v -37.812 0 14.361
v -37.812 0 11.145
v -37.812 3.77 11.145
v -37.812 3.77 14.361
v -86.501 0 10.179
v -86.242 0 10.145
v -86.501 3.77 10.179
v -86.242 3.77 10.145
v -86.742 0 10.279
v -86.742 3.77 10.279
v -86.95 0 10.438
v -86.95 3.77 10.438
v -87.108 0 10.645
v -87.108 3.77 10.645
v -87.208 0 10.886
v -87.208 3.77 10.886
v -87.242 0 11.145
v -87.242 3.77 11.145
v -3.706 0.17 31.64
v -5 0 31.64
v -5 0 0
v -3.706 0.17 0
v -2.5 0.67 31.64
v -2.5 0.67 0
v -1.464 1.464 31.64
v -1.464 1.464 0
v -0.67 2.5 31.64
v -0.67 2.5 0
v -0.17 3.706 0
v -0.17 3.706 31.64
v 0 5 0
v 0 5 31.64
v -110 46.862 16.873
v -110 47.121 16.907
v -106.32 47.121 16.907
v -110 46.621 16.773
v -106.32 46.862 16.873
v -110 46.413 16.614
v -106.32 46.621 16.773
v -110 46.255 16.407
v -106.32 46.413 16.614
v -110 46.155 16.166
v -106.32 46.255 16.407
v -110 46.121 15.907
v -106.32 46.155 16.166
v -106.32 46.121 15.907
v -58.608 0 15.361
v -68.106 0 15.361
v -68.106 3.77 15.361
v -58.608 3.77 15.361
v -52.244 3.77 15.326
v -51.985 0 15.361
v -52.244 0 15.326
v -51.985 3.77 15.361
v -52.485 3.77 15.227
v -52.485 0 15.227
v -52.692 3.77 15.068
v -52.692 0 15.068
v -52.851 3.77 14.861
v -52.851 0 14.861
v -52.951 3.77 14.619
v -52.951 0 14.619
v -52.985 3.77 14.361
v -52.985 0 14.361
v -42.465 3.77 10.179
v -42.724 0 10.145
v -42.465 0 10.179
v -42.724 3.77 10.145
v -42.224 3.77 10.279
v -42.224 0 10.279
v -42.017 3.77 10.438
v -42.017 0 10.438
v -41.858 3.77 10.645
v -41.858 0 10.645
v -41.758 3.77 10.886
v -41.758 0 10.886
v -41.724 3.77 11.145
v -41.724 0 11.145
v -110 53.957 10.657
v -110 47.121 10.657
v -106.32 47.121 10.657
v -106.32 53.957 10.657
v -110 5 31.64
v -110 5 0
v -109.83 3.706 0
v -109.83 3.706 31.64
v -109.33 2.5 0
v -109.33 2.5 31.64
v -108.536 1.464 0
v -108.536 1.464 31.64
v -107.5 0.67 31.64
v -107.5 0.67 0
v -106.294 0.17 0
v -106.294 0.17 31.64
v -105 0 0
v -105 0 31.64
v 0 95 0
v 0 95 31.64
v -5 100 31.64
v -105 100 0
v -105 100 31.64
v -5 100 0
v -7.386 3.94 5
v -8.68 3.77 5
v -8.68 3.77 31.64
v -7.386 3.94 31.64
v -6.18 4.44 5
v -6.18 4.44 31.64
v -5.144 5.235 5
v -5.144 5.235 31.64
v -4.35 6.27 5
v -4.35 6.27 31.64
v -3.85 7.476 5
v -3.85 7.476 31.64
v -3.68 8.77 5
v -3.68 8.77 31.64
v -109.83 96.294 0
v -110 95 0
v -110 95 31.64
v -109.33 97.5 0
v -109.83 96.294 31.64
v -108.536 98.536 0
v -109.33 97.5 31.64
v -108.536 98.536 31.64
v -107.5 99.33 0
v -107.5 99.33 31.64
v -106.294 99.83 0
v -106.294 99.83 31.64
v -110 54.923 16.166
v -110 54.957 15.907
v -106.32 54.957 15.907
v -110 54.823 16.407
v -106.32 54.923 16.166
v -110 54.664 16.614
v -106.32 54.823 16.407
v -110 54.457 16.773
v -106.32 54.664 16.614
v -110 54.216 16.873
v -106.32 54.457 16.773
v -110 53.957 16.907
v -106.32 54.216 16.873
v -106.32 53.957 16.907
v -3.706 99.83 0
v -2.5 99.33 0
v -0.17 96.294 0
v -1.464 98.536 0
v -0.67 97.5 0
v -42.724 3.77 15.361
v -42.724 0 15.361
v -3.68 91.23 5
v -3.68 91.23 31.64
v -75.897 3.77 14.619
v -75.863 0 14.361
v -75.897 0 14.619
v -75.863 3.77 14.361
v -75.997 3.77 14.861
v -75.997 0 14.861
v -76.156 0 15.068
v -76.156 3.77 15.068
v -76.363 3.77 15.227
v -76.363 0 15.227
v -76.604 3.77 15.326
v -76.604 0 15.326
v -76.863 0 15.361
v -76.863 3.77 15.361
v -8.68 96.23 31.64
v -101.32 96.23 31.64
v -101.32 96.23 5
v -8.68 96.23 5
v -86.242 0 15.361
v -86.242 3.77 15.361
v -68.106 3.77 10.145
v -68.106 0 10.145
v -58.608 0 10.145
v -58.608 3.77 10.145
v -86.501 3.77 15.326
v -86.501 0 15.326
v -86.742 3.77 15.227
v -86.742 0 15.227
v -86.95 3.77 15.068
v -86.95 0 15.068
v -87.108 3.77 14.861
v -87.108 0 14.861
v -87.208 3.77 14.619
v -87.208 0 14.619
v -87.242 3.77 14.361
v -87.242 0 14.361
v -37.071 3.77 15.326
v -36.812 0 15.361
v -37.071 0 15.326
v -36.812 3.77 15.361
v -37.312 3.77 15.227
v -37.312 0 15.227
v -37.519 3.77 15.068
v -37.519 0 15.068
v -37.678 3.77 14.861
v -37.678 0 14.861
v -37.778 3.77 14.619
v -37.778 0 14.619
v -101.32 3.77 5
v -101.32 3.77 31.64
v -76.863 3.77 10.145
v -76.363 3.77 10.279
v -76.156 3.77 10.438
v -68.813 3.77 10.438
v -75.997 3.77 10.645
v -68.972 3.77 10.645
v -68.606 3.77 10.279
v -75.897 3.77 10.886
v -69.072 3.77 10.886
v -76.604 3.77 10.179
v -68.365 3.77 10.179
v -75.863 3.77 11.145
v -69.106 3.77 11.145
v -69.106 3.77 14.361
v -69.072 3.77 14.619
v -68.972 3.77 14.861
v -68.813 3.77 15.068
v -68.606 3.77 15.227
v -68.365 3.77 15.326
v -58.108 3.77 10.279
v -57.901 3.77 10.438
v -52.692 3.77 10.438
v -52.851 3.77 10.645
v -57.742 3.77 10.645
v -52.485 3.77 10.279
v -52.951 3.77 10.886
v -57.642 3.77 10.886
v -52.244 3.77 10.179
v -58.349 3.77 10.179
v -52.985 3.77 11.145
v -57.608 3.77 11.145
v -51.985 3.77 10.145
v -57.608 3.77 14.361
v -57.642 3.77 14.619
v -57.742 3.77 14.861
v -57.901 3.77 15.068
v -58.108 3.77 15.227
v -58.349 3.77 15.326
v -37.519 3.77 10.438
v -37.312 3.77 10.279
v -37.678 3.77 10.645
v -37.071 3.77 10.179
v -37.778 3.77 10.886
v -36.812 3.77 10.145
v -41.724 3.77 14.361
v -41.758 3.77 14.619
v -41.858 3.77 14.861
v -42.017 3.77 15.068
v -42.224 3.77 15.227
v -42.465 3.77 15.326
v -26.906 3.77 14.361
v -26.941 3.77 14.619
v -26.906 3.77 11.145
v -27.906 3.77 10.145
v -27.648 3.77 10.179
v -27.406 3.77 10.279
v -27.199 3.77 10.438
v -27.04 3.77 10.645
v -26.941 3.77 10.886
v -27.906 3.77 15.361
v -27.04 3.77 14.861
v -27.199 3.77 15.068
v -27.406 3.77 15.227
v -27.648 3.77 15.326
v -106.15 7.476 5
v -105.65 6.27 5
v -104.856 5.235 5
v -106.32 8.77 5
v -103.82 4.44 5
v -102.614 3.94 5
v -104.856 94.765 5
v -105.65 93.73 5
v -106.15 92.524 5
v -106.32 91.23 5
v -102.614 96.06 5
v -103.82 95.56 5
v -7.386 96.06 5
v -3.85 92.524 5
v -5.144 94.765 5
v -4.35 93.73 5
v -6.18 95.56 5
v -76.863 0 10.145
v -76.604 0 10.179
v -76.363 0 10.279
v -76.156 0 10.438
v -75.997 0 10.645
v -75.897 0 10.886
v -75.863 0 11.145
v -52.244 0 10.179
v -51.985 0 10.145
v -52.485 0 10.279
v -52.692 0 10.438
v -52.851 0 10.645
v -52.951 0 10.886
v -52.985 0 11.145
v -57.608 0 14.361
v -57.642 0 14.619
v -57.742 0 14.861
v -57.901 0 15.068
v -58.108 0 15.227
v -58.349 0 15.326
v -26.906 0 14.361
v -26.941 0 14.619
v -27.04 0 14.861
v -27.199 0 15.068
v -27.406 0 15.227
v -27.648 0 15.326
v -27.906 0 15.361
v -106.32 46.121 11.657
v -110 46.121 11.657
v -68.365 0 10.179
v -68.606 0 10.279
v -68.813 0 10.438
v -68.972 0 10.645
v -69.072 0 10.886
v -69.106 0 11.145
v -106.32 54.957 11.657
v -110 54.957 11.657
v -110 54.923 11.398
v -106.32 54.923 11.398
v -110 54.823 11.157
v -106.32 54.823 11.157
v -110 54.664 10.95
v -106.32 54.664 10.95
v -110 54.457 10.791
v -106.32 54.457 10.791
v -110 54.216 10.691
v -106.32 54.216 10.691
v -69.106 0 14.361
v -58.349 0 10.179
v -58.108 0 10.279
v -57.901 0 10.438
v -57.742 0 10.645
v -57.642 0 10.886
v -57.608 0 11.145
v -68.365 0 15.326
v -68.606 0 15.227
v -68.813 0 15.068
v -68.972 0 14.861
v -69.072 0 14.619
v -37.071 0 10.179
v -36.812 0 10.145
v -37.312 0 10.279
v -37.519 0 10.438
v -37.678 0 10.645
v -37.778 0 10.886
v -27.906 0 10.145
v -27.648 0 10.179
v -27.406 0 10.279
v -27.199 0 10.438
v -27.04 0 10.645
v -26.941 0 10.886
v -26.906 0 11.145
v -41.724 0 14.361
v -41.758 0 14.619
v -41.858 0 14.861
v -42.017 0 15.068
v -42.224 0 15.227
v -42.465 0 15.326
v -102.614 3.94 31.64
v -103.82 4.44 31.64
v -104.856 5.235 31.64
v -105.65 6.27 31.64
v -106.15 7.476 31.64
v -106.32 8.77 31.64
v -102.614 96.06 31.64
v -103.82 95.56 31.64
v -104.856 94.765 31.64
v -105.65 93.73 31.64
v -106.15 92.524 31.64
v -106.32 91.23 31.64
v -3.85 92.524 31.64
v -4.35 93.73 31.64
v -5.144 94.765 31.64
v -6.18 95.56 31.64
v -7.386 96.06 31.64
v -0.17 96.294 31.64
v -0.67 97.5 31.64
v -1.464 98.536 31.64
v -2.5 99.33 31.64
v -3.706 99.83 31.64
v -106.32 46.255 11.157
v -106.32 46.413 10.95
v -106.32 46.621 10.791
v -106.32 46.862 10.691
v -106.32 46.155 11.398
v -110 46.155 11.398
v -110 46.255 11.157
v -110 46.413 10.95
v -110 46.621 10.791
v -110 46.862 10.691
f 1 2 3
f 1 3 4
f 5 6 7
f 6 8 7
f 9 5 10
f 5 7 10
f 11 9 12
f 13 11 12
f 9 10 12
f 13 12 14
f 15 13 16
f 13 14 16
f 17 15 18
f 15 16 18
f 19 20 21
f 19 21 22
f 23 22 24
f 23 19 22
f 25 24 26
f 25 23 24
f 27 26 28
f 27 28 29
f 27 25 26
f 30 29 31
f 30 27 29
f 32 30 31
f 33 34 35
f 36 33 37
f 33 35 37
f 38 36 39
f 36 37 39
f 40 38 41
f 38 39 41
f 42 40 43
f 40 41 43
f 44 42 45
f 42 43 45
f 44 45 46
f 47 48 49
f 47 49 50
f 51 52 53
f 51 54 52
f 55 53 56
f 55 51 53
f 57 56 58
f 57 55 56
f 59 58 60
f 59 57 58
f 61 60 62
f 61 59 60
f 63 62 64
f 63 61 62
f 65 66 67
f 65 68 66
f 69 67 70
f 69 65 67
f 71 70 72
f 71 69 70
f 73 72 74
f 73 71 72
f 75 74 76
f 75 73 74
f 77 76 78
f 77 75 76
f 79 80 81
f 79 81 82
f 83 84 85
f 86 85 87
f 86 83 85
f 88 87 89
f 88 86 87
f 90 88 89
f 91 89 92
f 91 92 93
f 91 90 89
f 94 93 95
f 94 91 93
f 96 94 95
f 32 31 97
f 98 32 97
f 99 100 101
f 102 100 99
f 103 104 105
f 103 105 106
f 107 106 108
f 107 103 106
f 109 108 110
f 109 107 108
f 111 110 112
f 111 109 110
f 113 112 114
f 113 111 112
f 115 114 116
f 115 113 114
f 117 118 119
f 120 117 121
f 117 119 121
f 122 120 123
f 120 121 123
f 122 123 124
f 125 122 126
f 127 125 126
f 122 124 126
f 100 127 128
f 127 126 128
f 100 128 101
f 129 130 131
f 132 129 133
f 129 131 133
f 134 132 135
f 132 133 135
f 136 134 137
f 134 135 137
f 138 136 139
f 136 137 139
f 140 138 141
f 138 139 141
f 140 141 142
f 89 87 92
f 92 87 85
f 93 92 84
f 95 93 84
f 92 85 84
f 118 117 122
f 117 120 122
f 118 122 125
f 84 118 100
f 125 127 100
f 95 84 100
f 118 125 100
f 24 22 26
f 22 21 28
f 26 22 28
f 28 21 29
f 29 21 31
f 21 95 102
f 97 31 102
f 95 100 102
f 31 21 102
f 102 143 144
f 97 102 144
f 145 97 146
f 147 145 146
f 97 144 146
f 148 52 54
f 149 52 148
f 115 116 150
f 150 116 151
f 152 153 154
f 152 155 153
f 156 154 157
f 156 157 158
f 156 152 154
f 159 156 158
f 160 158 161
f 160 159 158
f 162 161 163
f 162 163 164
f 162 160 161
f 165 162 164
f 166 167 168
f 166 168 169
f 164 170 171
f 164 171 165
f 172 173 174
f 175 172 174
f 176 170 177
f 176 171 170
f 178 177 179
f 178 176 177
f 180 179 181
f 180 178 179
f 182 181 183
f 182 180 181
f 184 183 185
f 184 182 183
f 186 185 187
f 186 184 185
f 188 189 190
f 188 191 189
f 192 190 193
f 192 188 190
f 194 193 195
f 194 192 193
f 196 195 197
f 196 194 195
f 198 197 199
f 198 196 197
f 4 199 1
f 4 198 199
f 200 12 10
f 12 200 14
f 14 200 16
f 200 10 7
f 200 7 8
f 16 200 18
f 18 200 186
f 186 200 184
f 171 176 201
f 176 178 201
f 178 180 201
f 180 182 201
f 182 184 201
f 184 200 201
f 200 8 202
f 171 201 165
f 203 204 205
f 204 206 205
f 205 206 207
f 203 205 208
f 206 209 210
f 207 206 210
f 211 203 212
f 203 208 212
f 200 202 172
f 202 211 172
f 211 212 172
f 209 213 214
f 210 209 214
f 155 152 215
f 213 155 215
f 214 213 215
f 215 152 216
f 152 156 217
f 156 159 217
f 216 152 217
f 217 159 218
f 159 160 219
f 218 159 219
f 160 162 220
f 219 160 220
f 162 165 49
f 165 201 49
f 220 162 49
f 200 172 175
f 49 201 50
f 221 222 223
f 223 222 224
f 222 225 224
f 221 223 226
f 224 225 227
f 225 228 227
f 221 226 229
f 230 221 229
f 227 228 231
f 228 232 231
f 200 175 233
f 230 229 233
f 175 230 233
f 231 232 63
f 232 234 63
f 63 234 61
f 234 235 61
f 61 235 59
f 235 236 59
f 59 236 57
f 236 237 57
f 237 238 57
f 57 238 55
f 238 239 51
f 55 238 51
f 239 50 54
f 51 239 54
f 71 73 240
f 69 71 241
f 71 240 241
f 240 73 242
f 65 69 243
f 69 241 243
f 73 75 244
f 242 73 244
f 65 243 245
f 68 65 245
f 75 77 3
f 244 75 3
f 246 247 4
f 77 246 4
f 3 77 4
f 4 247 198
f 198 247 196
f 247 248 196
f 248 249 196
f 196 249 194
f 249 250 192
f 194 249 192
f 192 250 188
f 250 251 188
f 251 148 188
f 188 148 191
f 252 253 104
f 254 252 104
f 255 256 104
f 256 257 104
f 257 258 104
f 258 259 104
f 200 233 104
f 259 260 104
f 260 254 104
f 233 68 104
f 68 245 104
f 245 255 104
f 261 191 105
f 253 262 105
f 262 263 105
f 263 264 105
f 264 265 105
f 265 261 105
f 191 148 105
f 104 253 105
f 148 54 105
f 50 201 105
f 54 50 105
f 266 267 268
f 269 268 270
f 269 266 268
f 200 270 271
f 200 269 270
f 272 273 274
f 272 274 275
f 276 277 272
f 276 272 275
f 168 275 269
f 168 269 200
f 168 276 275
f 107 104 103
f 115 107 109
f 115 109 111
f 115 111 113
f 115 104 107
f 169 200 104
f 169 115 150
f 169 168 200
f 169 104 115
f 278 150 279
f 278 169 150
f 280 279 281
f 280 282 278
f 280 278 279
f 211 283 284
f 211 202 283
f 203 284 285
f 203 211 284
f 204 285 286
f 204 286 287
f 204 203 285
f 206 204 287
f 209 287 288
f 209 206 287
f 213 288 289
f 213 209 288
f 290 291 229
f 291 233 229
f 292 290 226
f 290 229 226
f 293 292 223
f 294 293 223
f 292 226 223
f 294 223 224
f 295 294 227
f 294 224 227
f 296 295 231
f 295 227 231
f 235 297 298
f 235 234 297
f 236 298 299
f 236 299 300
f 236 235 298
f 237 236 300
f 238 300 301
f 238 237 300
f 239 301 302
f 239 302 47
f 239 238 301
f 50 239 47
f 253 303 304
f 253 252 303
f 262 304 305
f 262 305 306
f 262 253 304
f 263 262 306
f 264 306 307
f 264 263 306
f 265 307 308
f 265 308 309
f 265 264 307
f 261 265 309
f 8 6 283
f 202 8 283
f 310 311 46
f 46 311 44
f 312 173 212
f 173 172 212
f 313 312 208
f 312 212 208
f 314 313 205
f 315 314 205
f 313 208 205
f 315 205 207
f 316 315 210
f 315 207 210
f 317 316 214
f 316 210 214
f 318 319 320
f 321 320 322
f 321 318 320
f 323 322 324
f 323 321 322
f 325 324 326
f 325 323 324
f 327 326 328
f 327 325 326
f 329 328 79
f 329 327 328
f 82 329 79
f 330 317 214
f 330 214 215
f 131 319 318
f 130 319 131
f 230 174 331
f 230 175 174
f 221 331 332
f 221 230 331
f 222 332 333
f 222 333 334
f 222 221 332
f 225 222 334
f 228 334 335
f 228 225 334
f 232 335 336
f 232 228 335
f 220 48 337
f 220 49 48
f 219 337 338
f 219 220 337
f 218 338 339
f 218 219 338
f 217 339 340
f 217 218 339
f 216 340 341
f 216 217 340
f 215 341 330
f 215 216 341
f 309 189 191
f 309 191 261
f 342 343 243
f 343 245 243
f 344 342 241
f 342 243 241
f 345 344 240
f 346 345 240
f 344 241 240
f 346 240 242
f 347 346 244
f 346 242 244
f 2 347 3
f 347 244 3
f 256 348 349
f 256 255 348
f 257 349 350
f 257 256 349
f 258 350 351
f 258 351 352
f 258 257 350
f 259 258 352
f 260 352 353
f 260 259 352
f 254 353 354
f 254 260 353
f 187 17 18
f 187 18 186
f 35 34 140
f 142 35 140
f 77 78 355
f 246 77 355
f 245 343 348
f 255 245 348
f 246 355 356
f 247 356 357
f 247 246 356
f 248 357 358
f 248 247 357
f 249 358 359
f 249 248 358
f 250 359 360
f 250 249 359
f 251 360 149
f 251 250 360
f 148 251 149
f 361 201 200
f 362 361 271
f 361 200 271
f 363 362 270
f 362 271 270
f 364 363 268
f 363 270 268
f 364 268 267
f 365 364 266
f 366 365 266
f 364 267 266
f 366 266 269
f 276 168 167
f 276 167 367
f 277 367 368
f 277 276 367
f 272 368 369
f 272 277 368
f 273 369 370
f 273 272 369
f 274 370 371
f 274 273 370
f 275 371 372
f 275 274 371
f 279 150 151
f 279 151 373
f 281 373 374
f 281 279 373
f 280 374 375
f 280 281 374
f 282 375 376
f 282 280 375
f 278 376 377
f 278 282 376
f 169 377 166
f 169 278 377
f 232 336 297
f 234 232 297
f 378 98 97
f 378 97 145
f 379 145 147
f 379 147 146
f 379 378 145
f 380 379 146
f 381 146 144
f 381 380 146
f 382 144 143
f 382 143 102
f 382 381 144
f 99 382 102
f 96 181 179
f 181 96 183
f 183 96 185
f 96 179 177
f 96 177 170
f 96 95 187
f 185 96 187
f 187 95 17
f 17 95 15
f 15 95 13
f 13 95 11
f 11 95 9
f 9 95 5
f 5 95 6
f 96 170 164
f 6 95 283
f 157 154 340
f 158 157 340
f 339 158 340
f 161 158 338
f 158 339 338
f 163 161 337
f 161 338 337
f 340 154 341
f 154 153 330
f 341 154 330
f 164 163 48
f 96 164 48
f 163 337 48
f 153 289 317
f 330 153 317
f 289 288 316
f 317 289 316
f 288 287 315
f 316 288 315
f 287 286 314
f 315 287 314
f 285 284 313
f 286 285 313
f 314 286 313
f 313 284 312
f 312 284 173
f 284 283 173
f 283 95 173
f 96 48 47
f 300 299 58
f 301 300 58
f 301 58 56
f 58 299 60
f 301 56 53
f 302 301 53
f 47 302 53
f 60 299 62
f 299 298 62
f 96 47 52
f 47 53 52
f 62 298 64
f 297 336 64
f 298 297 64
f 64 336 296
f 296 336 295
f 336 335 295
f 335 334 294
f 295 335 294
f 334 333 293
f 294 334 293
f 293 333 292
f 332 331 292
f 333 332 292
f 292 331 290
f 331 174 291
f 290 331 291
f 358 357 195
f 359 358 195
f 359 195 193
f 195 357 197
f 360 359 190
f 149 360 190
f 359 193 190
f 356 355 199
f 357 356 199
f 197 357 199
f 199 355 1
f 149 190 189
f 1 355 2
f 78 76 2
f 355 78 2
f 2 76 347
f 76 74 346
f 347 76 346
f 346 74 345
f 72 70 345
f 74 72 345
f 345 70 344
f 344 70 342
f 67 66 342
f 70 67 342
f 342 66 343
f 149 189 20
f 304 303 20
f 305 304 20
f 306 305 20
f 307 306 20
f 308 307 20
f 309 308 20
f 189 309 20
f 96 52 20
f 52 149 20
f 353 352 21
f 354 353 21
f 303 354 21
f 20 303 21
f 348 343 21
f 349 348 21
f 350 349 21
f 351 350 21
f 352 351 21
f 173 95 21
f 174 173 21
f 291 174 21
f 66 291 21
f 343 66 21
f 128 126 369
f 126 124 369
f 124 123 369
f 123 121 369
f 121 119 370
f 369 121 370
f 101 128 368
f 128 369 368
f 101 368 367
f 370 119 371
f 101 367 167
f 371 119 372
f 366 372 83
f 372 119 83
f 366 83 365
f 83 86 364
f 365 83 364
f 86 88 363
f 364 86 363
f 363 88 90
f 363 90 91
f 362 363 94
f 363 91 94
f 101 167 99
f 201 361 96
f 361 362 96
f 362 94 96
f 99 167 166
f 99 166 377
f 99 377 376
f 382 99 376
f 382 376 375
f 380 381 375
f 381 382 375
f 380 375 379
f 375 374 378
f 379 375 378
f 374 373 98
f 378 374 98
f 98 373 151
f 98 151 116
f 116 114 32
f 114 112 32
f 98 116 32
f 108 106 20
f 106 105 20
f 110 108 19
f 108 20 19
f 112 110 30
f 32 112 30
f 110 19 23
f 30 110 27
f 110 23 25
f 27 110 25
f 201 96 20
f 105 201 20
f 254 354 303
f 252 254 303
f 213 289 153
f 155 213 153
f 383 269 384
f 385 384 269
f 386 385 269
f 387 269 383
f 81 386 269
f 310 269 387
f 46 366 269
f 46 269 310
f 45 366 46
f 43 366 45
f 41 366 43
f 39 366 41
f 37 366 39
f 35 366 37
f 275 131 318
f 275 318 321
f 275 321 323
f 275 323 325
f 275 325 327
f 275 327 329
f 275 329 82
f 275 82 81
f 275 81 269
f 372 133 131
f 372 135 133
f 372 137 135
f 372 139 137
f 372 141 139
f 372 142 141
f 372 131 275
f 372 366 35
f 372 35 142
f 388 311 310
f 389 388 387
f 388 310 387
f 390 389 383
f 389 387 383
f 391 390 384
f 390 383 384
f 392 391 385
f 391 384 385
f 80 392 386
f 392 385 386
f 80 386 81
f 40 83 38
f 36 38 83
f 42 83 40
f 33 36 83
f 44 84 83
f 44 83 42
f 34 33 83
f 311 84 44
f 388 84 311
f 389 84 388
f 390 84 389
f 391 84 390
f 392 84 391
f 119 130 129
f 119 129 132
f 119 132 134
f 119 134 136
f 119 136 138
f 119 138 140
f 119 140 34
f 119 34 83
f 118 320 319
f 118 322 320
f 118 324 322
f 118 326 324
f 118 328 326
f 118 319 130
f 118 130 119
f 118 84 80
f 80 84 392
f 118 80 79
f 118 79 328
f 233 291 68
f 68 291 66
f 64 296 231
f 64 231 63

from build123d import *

# Parameters (mm, degrees)
ESQUISSE1_W             = 110
ESQUISSE1_H             = 100
BOSS_EXTRU_1_DEPTH      = 60
CONG_1_R                = 5
ESQUISSE2_W             = 102.640200382
ESQUISSE2_H             = 92.45985442
ENL_V_MAT_EXTRU_1_DEPTH = 55
CONG_2_R                = 5
ESQUISSE3_W             = 11.37967439
ESQUISSE3_H             = 5.215684095
ESQUISSE3_W_2           = 11.498212665
ESQUISSE3_W_3           = 11.261136116
ESQUISSE3_W_4           = 10.905521291
ENL_V_MAT_EXTRU_2_DEPTH = 55
CONG_3_R                = 1
ESQUISSE4_W             = 6.250199949
ESQUISSE4_H             = 8.836489583
ENL_V_MAT_EXTRU_3_DEPTH = 55
CONG_4_R                = 1
ESQUISSE6_W             = 129.088181363
ESQUISSE6_H             = 36.035635569
ENL_V_MAT_EXTRU_5_DEPTH = 115


with BuildPart() as part:
    # Esquisse1 → Boss.-Extru.1 (new body)
    with BuildSketch(Plane.XY):
        with Locations((-55, 50)):
            Rectangle(ESQUISSE1_W, ESQUISSE1_H)
    extrude(amount=BOSS_EXTRU_1_DEPTH)

    # Congé1
    cong_1_edges = [part.edges().sort_by_distance(p)[0] for p in [
        (0, 0, 30),
        (-110, 0, 30),
        (-110, 100, 30),
        (0, 100, 30),
    ]]
    fillet(cong_1_edges, radius=CONG_1_R)

    # Esquisse2 → Enlèv. mat.-Extru.1 (cut)
    with BuildSketch(Plane.XY.offset(60)):
        with Locations((-55, 50)):
            Rectangle(ESQUISSE2_W, ESQUISSE2_H)
    extrude(amount=-ENL_V_MAT_EXTRU_1_DEPTH, mode=Mode.SUBTRACT)

    # Congé2
    cong_2_edges = [part.edges().sort_by_distance(p)[0] for p in [
        (-106.320100191, 3.77007279, 32.5),
        (-106.320100191, 96.22992721, 32.5),
        (-3.679899809, 96.22992721, 32.5),
        (-3.679899809, 3.77007279, 32.5),
    ]]
    fillet(cong_2_edges, radius=CONG_2_R)

    # Esquisse3 → Enlèv. mat.-Extru.2 (cut)
    with BuildSketch(Plane.XZ):
        with Locations((-81.552573577, 12.752681003)):
            Rectangle(ESQUISSE3_W, ESQUISSE3_H)
        with Locations((-63.356948381, 12.752681003)):
            Rectangle(ESQUISSE3_W_2, ESQUISSE3_H)
        with Locations((-47.354281269, 12.752681003)):
            Rectangle(ESQUISSE3_W_3, ESQUISSE3_H)
        with Locations((-32.359189495, 12.752681003)):
            Rectangle(ESQUISSE3_W_4, ESQUISSE3_H)
    extrude(amount=-ENL_V_MAT_EXTRU_2_DEPTH, mode=Mode.SUBTRACT)

    # Congé3
    cong_3_edges = [part.edges().sort_by_distance(p)[0] for p in [
        (-69.106054713, 1.885036395, 10.144838955),
        (-69.106054713, 1.885036395, 15.36052305),
        (-57.607842048, 1.885036395, 15.36052305),
        (-57.607842048, 1.885036395, 10.144838955),
        (-52.984849327, 1.885036395, 10.144838955),
        (-52.984849327, 1.885036395, 15.36052305),
        (-41.723713211, 1.885036395, 15.36052305),
        (-41.723713211, 1.885036395, 10.144838955),
        (-37.81195014, 1.885036395, 10.144838955),
        (-37.81195014, 1.885036395, 15.36052305),
        (-26.906428849, 1.885036395, 15.36052305),
        (-26.906428849, 1.885036395, 10.144838955),
        (-87.242410772, 1.885036395, 10.144838955),
        (-87.242410772, 1.885036395, 15.36052305),
        (-75.862736382, 1.885036395, 15.36052305),
        (-75.862736382, 1.885036395, 10.144838955),
    ]]
    fillet(cong_3_edges, radius=CONG_3_R)

    # Esquisse4 → Enlèv. mat.-Extru.3 (cut)
    with BuildSketch(Plane.ZY.offset(110)):
        with Locations((13.781808753, 50.538810341)):
            Rectangle(ESQUISSE4_W, ESQUISSE4_H)
    extrude(amount=-ENL_V_MAT_EXTRU_3_DEPTH, mode=Mode.SUBTRACT)

    # Congé4
    cong_4_edges = [part.edges().sort_by_distance(p)[0] for p in [
        (-108.160050095, 46.120565549, 16.906908727),
        (-108.160050095, 46.120565549, 10.656708778),
        (-108.160050095, 54.957055132, 10.656708778),
        (-108.160050095, 54.957055132, 16.906908727),
    ]]
    fillet(cong_4_edges, radius=CONG_4_R)

    # Esquisse6 → Enlèv. mat.-Extru.5 (cut)
    with BuildSketch(Plane(origin=(0, 0, 0), x_dir=(1, 0, 0), z_dir=(0, 1, 0))):
        with Locations((-55.445822543, -49.658229713)):
            Rectangle(ESQUISSE6_W, ESQUISSE6_H)
    extrude(amount=ENL_V_MAT_EXTRU_5_DEPTH, mode=Mode.SUBTRACT)


solid = part.part
